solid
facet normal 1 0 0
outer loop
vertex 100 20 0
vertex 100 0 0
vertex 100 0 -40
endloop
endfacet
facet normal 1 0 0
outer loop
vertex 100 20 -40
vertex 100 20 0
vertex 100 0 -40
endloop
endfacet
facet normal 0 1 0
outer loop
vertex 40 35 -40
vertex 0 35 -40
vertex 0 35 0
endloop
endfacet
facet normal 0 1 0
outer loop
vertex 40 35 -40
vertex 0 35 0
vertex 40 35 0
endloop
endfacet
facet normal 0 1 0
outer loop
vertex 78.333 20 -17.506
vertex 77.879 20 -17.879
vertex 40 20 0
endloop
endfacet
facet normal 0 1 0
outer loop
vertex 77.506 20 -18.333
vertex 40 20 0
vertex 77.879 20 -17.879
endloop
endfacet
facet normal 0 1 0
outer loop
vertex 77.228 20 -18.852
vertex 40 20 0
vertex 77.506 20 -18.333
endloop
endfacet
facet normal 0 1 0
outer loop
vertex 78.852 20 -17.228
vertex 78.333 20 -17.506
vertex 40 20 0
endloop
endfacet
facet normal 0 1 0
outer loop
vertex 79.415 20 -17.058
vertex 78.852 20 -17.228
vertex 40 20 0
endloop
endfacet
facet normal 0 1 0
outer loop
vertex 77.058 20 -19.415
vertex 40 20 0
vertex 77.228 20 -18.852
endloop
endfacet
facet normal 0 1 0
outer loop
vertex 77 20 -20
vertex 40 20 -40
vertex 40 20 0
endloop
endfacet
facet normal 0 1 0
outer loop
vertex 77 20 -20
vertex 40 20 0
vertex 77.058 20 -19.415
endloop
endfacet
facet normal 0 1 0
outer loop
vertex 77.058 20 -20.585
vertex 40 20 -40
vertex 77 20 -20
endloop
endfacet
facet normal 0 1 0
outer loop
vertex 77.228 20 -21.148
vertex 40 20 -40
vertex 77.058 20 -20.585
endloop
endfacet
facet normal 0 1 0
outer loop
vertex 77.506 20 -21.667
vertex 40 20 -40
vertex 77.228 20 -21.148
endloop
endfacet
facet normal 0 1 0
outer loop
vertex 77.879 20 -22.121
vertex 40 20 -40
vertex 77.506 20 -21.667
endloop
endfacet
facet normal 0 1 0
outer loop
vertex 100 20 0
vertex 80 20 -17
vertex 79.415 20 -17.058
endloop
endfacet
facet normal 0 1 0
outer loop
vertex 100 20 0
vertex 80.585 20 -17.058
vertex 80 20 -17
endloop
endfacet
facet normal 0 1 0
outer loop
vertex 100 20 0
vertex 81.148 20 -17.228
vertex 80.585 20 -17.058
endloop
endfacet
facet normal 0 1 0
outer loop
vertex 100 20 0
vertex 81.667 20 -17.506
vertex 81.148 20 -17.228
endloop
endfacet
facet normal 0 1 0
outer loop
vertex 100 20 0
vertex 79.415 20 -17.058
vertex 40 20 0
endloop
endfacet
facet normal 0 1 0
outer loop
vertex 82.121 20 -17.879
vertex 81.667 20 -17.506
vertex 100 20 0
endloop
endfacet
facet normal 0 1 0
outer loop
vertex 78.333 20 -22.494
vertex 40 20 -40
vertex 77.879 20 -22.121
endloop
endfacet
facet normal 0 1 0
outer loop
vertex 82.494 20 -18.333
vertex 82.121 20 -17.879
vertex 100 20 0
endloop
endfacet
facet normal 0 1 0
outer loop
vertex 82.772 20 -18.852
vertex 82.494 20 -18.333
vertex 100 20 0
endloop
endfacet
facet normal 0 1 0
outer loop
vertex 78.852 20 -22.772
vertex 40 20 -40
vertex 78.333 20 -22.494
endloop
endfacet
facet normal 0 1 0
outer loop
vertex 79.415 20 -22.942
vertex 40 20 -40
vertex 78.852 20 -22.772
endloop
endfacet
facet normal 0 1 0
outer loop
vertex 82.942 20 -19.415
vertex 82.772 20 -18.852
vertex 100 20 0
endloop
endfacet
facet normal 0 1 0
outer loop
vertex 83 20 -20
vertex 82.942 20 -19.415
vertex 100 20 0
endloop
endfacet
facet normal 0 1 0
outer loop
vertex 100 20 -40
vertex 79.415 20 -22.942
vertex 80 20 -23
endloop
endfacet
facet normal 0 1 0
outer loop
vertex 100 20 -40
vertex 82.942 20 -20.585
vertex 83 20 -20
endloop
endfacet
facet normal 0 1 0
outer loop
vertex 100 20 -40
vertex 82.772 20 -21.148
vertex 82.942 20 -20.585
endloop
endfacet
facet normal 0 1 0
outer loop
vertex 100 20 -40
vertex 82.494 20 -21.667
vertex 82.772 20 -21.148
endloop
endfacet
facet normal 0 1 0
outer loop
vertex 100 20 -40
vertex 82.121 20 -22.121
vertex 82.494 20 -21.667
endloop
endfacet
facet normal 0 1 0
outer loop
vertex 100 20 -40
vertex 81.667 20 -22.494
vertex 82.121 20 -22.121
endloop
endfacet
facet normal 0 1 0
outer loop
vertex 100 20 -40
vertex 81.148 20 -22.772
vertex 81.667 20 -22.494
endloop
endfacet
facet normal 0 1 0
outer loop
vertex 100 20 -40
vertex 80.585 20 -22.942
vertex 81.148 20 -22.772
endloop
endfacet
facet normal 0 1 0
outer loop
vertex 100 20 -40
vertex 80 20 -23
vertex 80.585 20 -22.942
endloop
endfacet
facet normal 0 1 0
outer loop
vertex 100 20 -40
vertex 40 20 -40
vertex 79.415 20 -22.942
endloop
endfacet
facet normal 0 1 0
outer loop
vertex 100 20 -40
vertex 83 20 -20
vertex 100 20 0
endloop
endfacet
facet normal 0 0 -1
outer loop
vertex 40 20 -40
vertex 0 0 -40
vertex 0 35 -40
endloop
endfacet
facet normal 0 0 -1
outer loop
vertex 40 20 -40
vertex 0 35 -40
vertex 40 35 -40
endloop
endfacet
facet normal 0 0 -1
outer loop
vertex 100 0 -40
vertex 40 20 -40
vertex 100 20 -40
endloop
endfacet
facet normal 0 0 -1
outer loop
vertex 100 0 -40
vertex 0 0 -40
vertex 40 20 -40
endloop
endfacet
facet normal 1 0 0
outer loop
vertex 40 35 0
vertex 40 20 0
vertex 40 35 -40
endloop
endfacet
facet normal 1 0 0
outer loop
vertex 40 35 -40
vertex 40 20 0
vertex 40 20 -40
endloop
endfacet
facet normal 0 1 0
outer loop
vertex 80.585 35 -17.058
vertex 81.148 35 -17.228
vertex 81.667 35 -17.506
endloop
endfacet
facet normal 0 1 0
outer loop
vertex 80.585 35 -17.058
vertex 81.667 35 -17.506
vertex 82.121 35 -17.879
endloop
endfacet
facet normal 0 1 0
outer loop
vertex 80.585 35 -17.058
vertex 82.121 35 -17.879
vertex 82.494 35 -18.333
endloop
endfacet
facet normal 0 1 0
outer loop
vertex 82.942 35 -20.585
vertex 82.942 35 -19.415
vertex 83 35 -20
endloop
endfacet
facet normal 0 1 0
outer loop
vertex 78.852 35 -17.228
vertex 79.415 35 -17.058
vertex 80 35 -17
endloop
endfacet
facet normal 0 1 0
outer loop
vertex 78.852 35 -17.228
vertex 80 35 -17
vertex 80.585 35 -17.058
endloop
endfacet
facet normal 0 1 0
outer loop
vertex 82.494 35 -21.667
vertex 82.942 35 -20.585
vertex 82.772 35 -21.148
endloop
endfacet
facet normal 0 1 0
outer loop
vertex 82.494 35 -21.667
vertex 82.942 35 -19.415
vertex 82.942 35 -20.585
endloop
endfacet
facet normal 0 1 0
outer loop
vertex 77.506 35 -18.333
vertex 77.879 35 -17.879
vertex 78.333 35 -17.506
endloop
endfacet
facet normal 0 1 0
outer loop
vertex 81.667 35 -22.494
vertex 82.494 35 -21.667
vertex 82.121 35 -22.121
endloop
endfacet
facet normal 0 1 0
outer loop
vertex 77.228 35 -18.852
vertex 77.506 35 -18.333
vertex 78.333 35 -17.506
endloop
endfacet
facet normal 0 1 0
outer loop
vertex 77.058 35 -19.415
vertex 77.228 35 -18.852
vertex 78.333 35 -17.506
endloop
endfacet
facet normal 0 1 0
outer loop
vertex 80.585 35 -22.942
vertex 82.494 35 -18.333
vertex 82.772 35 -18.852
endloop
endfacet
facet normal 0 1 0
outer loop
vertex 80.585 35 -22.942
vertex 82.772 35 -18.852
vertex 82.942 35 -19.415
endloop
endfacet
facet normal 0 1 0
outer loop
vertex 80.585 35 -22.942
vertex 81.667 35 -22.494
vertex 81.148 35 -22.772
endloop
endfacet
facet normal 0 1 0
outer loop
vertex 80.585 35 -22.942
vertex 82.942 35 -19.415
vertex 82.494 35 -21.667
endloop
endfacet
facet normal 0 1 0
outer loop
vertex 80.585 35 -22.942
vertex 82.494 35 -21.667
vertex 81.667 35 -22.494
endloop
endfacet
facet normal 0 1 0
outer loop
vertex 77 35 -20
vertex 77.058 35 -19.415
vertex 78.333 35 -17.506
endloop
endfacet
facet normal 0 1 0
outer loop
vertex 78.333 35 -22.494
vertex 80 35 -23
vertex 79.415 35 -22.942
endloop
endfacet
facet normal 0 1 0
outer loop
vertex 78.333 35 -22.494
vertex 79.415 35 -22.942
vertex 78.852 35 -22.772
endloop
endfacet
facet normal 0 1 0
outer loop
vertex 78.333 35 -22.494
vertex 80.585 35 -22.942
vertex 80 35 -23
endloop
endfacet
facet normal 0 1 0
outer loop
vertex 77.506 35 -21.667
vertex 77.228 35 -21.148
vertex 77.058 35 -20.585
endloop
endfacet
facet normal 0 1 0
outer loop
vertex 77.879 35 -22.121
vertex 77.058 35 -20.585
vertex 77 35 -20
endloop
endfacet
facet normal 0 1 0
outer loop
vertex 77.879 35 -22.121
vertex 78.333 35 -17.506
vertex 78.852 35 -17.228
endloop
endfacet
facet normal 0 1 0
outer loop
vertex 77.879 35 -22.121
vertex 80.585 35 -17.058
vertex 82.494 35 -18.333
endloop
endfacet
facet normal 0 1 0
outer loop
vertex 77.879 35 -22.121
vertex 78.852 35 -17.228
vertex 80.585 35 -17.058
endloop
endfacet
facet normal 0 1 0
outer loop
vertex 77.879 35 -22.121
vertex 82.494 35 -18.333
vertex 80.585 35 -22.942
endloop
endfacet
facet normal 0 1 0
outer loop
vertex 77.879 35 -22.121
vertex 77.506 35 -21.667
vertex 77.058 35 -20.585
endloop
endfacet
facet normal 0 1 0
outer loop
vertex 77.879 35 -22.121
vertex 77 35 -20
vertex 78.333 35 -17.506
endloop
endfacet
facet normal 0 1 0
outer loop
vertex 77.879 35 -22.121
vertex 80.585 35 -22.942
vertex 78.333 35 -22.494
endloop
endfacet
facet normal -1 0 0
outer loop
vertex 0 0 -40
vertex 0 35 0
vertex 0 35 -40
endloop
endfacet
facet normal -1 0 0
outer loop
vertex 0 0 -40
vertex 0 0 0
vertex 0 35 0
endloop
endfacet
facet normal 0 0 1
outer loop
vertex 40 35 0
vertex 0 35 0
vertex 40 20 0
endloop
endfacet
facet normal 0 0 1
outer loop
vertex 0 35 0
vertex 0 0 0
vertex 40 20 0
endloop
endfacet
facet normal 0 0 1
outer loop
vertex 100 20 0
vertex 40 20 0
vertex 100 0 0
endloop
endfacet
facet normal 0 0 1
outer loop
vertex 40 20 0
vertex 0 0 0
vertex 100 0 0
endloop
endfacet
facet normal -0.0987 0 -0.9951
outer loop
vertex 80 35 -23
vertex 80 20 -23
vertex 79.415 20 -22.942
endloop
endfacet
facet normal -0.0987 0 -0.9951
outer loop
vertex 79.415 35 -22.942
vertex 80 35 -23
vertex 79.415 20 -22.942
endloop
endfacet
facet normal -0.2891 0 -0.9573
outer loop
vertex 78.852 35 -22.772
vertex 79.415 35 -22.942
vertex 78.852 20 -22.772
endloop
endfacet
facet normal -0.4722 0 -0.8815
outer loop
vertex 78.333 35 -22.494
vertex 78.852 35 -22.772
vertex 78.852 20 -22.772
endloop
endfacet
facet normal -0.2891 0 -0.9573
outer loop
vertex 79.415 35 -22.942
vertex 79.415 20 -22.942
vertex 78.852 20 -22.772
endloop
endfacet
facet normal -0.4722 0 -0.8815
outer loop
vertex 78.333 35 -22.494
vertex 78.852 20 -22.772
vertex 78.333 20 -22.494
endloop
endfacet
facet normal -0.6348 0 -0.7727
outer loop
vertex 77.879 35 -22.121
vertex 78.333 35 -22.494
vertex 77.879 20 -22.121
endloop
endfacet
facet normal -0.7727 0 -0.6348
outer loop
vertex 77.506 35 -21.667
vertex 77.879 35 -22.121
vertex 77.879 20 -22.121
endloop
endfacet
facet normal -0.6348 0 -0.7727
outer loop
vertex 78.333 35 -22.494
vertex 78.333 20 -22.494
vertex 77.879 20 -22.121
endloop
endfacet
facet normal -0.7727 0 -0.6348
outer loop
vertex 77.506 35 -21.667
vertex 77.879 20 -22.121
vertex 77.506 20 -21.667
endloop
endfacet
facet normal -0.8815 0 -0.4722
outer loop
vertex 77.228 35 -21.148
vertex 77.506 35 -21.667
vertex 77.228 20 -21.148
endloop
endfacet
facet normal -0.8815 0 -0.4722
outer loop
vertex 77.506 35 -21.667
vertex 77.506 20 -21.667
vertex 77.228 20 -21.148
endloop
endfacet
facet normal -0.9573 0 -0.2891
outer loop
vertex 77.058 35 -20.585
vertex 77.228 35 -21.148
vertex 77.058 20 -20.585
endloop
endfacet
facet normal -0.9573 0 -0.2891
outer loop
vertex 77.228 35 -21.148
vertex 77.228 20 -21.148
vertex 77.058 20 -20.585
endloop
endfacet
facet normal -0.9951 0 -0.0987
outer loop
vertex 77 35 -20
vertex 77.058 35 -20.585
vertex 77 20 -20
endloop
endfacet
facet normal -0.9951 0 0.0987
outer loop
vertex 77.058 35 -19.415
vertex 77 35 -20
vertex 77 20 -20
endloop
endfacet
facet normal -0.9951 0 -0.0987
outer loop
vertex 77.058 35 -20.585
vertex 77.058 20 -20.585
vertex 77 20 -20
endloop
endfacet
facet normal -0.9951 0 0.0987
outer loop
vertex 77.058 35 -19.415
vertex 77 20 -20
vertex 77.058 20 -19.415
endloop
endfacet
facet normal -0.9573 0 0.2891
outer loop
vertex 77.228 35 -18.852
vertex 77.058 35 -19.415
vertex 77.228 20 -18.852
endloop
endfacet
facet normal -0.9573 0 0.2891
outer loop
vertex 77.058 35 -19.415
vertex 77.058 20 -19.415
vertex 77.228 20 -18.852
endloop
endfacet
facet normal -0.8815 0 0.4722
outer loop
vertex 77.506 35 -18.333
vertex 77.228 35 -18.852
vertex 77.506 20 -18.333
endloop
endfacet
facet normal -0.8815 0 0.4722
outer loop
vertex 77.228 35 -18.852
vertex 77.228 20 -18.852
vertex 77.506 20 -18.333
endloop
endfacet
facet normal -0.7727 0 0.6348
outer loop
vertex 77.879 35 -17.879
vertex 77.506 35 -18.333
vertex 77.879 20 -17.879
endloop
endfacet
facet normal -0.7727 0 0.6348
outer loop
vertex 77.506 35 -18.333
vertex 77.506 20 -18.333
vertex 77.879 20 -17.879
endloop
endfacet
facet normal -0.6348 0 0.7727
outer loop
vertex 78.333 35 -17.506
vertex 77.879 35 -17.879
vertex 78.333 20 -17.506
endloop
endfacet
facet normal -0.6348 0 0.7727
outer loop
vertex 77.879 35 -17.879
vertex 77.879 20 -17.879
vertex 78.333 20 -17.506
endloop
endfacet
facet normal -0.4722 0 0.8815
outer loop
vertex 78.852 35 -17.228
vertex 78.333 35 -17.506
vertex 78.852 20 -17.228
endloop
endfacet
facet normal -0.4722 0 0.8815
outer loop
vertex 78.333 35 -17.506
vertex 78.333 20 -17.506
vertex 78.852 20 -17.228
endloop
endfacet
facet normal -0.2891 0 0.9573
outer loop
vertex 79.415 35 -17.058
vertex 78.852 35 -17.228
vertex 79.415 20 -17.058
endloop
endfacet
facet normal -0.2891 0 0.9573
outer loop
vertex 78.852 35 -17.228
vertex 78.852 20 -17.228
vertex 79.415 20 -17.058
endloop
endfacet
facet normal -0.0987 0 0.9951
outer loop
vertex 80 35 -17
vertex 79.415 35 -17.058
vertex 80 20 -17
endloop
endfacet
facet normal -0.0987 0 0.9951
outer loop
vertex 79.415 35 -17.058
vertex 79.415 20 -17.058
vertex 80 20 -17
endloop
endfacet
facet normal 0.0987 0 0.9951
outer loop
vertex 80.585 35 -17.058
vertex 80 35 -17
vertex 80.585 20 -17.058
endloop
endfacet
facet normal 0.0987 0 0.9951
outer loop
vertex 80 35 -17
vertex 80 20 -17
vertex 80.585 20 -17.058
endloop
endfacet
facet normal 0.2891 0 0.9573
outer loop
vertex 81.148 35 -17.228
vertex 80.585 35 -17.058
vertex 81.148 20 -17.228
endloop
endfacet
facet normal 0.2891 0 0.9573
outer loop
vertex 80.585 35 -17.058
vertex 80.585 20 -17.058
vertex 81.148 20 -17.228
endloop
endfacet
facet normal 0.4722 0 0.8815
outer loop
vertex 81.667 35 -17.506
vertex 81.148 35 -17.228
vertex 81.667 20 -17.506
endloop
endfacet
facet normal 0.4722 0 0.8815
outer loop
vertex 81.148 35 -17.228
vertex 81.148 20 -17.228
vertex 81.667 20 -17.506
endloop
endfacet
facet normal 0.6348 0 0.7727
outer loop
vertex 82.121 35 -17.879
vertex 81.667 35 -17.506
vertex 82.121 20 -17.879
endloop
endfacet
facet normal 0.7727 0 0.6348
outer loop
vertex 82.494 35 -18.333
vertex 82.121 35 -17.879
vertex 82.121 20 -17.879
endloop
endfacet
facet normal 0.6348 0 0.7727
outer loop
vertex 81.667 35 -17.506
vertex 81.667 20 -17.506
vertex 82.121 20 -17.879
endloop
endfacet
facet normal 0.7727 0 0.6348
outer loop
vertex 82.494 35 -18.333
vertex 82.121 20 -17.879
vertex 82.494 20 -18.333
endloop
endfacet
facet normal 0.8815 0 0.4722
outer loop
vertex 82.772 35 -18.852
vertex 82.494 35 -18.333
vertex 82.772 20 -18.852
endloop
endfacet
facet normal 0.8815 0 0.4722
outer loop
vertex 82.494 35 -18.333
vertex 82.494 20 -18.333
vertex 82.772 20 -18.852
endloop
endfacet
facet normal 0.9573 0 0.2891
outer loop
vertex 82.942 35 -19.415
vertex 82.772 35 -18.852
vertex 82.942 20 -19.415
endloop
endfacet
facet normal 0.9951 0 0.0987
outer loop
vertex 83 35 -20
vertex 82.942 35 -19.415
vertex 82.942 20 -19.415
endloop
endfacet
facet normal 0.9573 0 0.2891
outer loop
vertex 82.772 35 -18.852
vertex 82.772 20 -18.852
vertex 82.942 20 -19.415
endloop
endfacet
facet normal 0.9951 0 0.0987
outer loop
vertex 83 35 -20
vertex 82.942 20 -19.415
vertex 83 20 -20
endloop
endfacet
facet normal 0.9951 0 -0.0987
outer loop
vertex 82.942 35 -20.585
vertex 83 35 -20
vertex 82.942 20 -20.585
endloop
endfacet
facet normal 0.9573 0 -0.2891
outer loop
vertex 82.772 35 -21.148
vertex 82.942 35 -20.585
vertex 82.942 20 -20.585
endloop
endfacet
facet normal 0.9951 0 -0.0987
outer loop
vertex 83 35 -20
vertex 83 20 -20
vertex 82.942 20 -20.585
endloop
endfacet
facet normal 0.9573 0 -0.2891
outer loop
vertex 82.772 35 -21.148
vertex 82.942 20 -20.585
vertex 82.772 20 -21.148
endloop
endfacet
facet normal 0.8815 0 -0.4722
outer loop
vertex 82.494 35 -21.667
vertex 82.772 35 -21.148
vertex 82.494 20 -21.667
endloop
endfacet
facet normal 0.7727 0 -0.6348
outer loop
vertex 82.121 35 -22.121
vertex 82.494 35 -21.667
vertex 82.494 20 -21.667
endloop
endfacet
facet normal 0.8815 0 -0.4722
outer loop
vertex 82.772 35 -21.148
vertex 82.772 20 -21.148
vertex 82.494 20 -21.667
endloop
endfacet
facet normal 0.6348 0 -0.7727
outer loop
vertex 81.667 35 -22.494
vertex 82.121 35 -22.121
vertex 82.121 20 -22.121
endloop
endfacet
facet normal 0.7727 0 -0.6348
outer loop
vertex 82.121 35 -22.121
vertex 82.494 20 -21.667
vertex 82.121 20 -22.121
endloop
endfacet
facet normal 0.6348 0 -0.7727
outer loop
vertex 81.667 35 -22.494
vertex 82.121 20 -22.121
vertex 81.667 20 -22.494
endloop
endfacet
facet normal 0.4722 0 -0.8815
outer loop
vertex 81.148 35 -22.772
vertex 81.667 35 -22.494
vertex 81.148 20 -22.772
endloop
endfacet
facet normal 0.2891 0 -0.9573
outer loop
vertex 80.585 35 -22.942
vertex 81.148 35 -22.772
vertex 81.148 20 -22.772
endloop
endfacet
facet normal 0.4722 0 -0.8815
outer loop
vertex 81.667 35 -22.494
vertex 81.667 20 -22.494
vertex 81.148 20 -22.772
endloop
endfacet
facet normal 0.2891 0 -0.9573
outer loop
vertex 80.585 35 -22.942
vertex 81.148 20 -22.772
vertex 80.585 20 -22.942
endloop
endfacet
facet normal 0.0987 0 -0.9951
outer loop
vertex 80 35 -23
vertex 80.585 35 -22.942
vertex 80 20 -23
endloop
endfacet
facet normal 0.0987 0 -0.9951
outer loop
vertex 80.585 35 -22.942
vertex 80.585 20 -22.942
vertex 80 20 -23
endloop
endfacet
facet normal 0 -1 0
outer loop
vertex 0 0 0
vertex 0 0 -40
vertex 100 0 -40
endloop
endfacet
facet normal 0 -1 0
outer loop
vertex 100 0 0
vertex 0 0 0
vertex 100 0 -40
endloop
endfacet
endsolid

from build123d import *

# Parameters (mm, degrees)
SKETCH1_W           = 100
SKETCH1_H           = 40
BOSS_EXTRUDE1_DEPTH = 20
SKETCH2_R           = 3
BOSS_EXTRUDE2_DEPTH = 15
SKETCH3_W           = 40
SKETCH3_H           = 40
BOSS_EXTRUDE3_DEPTH = 15


with BuildPart() as part:
    # Sketch1 → Boss-Extrude1 (new body)
    with BuildSketch(Plane(origin=(0, 0, 0), x_dir=(1, 0, 0), z_dir=(0, 1, 0))):
        with Locations((50, 20)):
            Rectangle(SKETCH1_W, SKETCH1_H)
    extrude(amount=BOSS_EXTRUDE1_DEPTH)

    # Sketch2 → Boss-Extrude2 (add)
    with BuildSketch(Plane(origin=(0, 20, 0), x_dir=(1, 0, 0), z_dir=(0, 1, 0))):
        with Locations(Location((80, 20, 0), (0, 0, 90))):
            Circle(SKETCH2_R)
    extrude(amount=BOSS_EXTRUDE2_DEPTH)

    # Sketch3 → Boss-Extrude3 (add)
    with BuildSketch(Plane(origin=(0, 20, 0), x_dir=(1, 0, 0), z_dir=(0, 1, 0))):
        with Locations((20, 20)):
            Rectangle(SKETCH3_W, SKETCH3_H)
    extrude(amount=BOSS_EXTRUDE3_DEPTH)


solid = part.part
